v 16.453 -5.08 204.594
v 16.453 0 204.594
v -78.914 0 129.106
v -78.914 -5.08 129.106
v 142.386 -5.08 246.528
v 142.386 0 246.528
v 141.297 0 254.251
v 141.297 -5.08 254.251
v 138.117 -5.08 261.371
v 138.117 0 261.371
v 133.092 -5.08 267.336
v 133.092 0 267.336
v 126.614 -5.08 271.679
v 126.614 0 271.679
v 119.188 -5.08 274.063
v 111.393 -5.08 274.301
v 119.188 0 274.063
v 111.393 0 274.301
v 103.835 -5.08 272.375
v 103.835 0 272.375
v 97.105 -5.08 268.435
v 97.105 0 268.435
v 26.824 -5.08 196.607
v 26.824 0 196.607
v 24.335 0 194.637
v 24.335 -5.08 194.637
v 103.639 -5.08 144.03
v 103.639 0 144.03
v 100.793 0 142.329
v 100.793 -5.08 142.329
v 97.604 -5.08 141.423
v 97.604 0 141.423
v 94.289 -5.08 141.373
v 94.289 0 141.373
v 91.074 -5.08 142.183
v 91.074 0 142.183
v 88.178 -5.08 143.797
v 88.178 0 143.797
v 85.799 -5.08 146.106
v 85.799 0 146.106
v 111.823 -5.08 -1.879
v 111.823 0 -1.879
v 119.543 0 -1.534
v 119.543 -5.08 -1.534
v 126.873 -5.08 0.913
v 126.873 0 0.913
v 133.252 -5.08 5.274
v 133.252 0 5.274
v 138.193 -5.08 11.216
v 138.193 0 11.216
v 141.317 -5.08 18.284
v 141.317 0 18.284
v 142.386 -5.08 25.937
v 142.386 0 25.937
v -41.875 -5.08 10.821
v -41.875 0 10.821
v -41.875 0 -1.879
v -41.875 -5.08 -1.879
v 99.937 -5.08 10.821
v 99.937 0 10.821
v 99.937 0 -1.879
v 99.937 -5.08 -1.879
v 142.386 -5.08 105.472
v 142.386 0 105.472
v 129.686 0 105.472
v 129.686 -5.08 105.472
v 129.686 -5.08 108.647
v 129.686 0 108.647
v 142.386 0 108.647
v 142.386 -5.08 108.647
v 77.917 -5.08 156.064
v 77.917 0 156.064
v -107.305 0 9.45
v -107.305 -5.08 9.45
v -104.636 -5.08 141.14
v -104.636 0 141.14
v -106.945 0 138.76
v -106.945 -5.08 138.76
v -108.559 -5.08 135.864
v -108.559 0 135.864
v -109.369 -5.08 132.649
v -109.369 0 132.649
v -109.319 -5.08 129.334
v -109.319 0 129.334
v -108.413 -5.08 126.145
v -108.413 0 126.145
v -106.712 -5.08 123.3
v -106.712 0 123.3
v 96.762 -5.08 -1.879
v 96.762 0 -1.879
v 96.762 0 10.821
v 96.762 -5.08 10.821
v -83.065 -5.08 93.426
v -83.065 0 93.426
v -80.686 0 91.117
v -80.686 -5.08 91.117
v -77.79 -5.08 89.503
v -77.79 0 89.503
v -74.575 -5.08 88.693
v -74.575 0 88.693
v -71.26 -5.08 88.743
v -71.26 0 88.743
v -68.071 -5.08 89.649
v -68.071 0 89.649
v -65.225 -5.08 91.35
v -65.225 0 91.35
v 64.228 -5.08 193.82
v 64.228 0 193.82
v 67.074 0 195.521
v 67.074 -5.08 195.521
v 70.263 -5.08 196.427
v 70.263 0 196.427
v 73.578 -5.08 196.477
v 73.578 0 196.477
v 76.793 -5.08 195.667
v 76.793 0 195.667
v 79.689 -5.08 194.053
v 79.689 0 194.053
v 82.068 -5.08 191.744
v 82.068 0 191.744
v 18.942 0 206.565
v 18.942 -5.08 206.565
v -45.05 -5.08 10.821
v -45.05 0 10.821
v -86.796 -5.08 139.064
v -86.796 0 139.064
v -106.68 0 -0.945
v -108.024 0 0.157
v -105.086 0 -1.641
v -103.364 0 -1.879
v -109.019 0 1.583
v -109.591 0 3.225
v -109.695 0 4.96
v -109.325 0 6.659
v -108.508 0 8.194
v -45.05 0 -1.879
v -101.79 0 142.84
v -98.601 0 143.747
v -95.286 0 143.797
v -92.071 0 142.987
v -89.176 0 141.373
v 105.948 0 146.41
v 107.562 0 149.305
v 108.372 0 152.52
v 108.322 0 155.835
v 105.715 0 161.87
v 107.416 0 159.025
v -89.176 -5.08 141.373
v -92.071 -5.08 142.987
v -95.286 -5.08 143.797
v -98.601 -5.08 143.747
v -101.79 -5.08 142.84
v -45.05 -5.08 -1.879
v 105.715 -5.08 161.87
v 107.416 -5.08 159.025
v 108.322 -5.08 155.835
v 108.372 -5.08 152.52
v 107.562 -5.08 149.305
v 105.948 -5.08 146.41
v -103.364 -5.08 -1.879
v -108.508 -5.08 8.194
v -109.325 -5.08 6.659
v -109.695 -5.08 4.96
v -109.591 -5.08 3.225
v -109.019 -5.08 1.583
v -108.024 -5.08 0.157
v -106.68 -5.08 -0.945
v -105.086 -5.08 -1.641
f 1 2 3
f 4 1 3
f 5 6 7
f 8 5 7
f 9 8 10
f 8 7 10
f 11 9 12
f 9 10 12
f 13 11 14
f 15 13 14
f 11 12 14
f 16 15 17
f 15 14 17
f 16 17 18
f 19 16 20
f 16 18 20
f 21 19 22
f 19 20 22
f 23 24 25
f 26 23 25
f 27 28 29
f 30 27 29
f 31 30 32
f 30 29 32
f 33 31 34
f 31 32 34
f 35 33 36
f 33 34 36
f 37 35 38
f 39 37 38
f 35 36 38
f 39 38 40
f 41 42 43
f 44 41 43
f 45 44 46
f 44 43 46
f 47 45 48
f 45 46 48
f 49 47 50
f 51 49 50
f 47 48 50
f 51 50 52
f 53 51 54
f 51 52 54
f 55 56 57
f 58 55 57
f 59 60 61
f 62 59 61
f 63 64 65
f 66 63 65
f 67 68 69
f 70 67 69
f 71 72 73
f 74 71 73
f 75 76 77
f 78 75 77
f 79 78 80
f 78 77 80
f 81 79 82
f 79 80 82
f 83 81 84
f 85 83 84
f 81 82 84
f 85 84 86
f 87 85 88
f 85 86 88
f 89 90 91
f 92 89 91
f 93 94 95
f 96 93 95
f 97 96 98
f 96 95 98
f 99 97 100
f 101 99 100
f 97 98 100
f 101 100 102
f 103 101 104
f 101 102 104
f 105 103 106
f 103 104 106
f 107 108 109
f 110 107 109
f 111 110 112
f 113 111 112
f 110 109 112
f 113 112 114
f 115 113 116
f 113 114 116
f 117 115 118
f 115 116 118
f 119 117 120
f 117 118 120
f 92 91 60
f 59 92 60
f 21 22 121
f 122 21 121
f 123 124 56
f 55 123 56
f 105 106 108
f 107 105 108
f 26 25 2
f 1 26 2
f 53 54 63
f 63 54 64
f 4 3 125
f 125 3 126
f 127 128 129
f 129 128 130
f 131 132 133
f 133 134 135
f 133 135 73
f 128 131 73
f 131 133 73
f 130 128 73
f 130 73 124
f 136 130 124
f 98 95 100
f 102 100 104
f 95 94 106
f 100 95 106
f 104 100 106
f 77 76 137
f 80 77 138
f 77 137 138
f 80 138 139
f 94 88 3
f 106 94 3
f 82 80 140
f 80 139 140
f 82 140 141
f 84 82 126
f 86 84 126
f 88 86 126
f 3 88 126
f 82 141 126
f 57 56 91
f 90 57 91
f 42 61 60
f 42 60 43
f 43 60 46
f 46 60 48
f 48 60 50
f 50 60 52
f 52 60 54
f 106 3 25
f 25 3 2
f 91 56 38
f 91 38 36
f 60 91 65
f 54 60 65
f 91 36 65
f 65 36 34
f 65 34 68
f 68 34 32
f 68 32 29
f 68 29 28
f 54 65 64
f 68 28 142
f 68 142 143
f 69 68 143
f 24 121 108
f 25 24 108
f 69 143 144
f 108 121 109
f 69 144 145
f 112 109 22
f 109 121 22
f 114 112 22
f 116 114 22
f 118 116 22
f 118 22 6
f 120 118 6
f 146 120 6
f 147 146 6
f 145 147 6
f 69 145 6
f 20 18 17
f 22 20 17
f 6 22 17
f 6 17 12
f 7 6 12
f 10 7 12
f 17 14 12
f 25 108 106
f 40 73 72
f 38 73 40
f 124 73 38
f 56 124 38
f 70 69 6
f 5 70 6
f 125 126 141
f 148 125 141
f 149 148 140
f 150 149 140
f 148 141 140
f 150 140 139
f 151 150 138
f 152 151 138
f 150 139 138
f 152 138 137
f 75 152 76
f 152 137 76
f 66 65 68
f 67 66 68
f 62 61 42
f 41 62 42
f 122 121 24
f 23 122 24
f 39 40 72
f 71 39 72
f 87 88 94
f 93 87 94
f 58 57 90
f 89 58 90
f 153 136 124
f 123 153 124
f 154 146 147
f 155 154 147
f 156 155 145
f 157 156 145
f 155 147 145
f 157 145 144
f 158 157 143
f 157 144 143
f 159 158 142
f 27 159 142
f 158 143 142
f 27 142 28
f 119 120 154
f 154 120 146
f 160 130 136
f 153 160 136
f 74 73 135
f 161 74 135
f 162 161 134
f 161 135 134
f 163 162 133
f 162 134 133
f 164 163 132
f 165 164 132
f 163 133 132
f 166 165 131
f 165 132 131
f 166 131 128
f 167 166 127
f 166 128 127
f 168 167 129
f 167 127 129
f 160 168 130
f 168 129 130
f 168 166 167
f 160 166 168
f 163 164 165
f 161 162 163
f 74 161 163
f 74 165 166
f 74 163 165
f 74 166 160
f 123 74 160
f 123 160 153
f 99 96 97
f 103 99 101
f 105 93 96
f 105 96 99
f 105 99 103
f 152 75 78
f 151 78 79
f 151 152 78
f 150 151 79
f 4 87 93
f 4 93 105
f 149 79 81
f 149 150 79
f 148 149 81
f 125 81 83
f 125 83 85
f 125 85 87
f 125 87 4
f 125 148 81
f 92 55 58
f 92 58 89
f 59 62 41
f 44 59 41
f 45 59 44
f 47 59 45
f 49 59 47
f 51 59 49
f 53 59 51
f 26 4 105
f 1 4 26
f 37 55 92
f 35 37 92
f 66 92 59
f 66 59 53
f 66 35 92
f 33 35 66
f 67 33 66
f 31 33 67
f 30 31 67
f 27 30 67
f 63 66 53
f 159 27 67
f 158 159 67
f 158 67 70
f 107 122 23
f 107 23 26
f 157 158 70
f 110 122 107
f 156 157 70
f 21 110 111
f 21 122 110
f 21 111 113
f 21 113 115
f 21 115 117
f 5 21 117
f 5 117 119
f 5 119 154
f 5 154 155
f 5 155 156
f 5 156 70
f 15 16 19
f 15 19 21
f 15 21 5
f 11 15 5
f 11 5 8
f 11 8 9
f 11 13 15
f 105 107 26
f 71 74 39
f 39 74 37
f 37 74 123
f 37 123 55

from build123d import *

# Parameters (mm, degrees)
F1_DEPTH = 5.08


with BuildPart() as f1:
    # F0 (on Front) → F1 (new body)
    with BuildSketch(Plane.XZ):
        with BuildLine():
            Line((-78.91387, 129.106149), (-86.796143, 139.064049))
            ThreePointArc((-86.796143, 139.064049), (-95.286354, 143.796683), (-104.636317, 141.139675))
            ThreePointArc((-104.636317, 141.139675), (-109.36895, 132.649465), (-106.711943, 123.299502))
            Line((-106.711943, 123.299502), (-83.065122, 93.425803))
            ThreePointArc((-83.065122, 93.425803), (-74.574912, 88.693169), (-65.224949, 91.350177))
            Line((-65.224949, 91.350177), (64.227746, 193.819732))
            ThreePointArc((64.227746, 193.819732), (73.577709, 196.47674), (82.067919, 191.744106))
            Line((82.067919, 191.744106), (105.714739, 161.870408))
            ThreePointArc((105.714739, 161.870408), (108.371747, 152.520445), (103.639113, 144.030234))
            ThreePointArc((103.639113, 144.030234), (94.289151, 141.373227), (85.79894, 146.105861))
            Line((85.79894, 146.105861), (77.916667, 156.06376))
            Line((77.916667, 156.06376), (-107.305268, 9.449514))
            ThreePointArc((-107.305268, 9.449514), (-109.361582, 2.384159), (-103.364131, -1.879436))
            Line((-103.364131, -1.879436), (-45.04985, -1.879436))
            Line((-45.04985, -1.879436), (-45.04985, 10.820564))
            Line((-45.04985, 10.820564), (-41.87485, 10.820564))
            Line((-41.87485, 10.820564), (-41.87485, -1.879436))
            Line((-41.87485, -1.879436), (96.761584, -1.879436))
            Line((96.761584, -1.879436), (96.761584, 10.820564))
            Line((96.761584, 10.820564), (99.936584, 10.820564))
            Line((99.936584, 10.820564), (99.936584, -1.879436))
            Line((99.936584, -1.879436), (111.823284, -1.879436))
            ThreePointArc((111.823284, -1.879436), (133.252209, 5.274321), (142.385621, 25.937231))
            Line((142.385621, 25.937231), (142.385621, 105.471752))
            Line((142.385621, 105.471752), (129.685621, 105.471752))
            Line((129.685621, 105.471752), (129.685621, 108.646752))
            Line((129.685621, 108.646752), (142.385621, 108.646752))
            Line((142.385621, 108.646752), (142.385621, 246.527939))
            ThreePointArc((142.385621, 246.527939), (126.613941, 271.678994), (97.104619, 268.435318))
            Line((97.104619, 268.435318), (18.94209, 206.564998))
            Line((18.94209, 206.564998), (26.824363, 196.607098))
            Line((26.824363, 196.607098), (24.334888, 194.63653))
            Line((24.334888, 194.63653), (16.452615, 204.594429))
            Line((16.452615, 204.594429), (-78.91387, 129.106149))
        make_face()
    extrude(amount=F1_DEPTH)


solid = f1.part
